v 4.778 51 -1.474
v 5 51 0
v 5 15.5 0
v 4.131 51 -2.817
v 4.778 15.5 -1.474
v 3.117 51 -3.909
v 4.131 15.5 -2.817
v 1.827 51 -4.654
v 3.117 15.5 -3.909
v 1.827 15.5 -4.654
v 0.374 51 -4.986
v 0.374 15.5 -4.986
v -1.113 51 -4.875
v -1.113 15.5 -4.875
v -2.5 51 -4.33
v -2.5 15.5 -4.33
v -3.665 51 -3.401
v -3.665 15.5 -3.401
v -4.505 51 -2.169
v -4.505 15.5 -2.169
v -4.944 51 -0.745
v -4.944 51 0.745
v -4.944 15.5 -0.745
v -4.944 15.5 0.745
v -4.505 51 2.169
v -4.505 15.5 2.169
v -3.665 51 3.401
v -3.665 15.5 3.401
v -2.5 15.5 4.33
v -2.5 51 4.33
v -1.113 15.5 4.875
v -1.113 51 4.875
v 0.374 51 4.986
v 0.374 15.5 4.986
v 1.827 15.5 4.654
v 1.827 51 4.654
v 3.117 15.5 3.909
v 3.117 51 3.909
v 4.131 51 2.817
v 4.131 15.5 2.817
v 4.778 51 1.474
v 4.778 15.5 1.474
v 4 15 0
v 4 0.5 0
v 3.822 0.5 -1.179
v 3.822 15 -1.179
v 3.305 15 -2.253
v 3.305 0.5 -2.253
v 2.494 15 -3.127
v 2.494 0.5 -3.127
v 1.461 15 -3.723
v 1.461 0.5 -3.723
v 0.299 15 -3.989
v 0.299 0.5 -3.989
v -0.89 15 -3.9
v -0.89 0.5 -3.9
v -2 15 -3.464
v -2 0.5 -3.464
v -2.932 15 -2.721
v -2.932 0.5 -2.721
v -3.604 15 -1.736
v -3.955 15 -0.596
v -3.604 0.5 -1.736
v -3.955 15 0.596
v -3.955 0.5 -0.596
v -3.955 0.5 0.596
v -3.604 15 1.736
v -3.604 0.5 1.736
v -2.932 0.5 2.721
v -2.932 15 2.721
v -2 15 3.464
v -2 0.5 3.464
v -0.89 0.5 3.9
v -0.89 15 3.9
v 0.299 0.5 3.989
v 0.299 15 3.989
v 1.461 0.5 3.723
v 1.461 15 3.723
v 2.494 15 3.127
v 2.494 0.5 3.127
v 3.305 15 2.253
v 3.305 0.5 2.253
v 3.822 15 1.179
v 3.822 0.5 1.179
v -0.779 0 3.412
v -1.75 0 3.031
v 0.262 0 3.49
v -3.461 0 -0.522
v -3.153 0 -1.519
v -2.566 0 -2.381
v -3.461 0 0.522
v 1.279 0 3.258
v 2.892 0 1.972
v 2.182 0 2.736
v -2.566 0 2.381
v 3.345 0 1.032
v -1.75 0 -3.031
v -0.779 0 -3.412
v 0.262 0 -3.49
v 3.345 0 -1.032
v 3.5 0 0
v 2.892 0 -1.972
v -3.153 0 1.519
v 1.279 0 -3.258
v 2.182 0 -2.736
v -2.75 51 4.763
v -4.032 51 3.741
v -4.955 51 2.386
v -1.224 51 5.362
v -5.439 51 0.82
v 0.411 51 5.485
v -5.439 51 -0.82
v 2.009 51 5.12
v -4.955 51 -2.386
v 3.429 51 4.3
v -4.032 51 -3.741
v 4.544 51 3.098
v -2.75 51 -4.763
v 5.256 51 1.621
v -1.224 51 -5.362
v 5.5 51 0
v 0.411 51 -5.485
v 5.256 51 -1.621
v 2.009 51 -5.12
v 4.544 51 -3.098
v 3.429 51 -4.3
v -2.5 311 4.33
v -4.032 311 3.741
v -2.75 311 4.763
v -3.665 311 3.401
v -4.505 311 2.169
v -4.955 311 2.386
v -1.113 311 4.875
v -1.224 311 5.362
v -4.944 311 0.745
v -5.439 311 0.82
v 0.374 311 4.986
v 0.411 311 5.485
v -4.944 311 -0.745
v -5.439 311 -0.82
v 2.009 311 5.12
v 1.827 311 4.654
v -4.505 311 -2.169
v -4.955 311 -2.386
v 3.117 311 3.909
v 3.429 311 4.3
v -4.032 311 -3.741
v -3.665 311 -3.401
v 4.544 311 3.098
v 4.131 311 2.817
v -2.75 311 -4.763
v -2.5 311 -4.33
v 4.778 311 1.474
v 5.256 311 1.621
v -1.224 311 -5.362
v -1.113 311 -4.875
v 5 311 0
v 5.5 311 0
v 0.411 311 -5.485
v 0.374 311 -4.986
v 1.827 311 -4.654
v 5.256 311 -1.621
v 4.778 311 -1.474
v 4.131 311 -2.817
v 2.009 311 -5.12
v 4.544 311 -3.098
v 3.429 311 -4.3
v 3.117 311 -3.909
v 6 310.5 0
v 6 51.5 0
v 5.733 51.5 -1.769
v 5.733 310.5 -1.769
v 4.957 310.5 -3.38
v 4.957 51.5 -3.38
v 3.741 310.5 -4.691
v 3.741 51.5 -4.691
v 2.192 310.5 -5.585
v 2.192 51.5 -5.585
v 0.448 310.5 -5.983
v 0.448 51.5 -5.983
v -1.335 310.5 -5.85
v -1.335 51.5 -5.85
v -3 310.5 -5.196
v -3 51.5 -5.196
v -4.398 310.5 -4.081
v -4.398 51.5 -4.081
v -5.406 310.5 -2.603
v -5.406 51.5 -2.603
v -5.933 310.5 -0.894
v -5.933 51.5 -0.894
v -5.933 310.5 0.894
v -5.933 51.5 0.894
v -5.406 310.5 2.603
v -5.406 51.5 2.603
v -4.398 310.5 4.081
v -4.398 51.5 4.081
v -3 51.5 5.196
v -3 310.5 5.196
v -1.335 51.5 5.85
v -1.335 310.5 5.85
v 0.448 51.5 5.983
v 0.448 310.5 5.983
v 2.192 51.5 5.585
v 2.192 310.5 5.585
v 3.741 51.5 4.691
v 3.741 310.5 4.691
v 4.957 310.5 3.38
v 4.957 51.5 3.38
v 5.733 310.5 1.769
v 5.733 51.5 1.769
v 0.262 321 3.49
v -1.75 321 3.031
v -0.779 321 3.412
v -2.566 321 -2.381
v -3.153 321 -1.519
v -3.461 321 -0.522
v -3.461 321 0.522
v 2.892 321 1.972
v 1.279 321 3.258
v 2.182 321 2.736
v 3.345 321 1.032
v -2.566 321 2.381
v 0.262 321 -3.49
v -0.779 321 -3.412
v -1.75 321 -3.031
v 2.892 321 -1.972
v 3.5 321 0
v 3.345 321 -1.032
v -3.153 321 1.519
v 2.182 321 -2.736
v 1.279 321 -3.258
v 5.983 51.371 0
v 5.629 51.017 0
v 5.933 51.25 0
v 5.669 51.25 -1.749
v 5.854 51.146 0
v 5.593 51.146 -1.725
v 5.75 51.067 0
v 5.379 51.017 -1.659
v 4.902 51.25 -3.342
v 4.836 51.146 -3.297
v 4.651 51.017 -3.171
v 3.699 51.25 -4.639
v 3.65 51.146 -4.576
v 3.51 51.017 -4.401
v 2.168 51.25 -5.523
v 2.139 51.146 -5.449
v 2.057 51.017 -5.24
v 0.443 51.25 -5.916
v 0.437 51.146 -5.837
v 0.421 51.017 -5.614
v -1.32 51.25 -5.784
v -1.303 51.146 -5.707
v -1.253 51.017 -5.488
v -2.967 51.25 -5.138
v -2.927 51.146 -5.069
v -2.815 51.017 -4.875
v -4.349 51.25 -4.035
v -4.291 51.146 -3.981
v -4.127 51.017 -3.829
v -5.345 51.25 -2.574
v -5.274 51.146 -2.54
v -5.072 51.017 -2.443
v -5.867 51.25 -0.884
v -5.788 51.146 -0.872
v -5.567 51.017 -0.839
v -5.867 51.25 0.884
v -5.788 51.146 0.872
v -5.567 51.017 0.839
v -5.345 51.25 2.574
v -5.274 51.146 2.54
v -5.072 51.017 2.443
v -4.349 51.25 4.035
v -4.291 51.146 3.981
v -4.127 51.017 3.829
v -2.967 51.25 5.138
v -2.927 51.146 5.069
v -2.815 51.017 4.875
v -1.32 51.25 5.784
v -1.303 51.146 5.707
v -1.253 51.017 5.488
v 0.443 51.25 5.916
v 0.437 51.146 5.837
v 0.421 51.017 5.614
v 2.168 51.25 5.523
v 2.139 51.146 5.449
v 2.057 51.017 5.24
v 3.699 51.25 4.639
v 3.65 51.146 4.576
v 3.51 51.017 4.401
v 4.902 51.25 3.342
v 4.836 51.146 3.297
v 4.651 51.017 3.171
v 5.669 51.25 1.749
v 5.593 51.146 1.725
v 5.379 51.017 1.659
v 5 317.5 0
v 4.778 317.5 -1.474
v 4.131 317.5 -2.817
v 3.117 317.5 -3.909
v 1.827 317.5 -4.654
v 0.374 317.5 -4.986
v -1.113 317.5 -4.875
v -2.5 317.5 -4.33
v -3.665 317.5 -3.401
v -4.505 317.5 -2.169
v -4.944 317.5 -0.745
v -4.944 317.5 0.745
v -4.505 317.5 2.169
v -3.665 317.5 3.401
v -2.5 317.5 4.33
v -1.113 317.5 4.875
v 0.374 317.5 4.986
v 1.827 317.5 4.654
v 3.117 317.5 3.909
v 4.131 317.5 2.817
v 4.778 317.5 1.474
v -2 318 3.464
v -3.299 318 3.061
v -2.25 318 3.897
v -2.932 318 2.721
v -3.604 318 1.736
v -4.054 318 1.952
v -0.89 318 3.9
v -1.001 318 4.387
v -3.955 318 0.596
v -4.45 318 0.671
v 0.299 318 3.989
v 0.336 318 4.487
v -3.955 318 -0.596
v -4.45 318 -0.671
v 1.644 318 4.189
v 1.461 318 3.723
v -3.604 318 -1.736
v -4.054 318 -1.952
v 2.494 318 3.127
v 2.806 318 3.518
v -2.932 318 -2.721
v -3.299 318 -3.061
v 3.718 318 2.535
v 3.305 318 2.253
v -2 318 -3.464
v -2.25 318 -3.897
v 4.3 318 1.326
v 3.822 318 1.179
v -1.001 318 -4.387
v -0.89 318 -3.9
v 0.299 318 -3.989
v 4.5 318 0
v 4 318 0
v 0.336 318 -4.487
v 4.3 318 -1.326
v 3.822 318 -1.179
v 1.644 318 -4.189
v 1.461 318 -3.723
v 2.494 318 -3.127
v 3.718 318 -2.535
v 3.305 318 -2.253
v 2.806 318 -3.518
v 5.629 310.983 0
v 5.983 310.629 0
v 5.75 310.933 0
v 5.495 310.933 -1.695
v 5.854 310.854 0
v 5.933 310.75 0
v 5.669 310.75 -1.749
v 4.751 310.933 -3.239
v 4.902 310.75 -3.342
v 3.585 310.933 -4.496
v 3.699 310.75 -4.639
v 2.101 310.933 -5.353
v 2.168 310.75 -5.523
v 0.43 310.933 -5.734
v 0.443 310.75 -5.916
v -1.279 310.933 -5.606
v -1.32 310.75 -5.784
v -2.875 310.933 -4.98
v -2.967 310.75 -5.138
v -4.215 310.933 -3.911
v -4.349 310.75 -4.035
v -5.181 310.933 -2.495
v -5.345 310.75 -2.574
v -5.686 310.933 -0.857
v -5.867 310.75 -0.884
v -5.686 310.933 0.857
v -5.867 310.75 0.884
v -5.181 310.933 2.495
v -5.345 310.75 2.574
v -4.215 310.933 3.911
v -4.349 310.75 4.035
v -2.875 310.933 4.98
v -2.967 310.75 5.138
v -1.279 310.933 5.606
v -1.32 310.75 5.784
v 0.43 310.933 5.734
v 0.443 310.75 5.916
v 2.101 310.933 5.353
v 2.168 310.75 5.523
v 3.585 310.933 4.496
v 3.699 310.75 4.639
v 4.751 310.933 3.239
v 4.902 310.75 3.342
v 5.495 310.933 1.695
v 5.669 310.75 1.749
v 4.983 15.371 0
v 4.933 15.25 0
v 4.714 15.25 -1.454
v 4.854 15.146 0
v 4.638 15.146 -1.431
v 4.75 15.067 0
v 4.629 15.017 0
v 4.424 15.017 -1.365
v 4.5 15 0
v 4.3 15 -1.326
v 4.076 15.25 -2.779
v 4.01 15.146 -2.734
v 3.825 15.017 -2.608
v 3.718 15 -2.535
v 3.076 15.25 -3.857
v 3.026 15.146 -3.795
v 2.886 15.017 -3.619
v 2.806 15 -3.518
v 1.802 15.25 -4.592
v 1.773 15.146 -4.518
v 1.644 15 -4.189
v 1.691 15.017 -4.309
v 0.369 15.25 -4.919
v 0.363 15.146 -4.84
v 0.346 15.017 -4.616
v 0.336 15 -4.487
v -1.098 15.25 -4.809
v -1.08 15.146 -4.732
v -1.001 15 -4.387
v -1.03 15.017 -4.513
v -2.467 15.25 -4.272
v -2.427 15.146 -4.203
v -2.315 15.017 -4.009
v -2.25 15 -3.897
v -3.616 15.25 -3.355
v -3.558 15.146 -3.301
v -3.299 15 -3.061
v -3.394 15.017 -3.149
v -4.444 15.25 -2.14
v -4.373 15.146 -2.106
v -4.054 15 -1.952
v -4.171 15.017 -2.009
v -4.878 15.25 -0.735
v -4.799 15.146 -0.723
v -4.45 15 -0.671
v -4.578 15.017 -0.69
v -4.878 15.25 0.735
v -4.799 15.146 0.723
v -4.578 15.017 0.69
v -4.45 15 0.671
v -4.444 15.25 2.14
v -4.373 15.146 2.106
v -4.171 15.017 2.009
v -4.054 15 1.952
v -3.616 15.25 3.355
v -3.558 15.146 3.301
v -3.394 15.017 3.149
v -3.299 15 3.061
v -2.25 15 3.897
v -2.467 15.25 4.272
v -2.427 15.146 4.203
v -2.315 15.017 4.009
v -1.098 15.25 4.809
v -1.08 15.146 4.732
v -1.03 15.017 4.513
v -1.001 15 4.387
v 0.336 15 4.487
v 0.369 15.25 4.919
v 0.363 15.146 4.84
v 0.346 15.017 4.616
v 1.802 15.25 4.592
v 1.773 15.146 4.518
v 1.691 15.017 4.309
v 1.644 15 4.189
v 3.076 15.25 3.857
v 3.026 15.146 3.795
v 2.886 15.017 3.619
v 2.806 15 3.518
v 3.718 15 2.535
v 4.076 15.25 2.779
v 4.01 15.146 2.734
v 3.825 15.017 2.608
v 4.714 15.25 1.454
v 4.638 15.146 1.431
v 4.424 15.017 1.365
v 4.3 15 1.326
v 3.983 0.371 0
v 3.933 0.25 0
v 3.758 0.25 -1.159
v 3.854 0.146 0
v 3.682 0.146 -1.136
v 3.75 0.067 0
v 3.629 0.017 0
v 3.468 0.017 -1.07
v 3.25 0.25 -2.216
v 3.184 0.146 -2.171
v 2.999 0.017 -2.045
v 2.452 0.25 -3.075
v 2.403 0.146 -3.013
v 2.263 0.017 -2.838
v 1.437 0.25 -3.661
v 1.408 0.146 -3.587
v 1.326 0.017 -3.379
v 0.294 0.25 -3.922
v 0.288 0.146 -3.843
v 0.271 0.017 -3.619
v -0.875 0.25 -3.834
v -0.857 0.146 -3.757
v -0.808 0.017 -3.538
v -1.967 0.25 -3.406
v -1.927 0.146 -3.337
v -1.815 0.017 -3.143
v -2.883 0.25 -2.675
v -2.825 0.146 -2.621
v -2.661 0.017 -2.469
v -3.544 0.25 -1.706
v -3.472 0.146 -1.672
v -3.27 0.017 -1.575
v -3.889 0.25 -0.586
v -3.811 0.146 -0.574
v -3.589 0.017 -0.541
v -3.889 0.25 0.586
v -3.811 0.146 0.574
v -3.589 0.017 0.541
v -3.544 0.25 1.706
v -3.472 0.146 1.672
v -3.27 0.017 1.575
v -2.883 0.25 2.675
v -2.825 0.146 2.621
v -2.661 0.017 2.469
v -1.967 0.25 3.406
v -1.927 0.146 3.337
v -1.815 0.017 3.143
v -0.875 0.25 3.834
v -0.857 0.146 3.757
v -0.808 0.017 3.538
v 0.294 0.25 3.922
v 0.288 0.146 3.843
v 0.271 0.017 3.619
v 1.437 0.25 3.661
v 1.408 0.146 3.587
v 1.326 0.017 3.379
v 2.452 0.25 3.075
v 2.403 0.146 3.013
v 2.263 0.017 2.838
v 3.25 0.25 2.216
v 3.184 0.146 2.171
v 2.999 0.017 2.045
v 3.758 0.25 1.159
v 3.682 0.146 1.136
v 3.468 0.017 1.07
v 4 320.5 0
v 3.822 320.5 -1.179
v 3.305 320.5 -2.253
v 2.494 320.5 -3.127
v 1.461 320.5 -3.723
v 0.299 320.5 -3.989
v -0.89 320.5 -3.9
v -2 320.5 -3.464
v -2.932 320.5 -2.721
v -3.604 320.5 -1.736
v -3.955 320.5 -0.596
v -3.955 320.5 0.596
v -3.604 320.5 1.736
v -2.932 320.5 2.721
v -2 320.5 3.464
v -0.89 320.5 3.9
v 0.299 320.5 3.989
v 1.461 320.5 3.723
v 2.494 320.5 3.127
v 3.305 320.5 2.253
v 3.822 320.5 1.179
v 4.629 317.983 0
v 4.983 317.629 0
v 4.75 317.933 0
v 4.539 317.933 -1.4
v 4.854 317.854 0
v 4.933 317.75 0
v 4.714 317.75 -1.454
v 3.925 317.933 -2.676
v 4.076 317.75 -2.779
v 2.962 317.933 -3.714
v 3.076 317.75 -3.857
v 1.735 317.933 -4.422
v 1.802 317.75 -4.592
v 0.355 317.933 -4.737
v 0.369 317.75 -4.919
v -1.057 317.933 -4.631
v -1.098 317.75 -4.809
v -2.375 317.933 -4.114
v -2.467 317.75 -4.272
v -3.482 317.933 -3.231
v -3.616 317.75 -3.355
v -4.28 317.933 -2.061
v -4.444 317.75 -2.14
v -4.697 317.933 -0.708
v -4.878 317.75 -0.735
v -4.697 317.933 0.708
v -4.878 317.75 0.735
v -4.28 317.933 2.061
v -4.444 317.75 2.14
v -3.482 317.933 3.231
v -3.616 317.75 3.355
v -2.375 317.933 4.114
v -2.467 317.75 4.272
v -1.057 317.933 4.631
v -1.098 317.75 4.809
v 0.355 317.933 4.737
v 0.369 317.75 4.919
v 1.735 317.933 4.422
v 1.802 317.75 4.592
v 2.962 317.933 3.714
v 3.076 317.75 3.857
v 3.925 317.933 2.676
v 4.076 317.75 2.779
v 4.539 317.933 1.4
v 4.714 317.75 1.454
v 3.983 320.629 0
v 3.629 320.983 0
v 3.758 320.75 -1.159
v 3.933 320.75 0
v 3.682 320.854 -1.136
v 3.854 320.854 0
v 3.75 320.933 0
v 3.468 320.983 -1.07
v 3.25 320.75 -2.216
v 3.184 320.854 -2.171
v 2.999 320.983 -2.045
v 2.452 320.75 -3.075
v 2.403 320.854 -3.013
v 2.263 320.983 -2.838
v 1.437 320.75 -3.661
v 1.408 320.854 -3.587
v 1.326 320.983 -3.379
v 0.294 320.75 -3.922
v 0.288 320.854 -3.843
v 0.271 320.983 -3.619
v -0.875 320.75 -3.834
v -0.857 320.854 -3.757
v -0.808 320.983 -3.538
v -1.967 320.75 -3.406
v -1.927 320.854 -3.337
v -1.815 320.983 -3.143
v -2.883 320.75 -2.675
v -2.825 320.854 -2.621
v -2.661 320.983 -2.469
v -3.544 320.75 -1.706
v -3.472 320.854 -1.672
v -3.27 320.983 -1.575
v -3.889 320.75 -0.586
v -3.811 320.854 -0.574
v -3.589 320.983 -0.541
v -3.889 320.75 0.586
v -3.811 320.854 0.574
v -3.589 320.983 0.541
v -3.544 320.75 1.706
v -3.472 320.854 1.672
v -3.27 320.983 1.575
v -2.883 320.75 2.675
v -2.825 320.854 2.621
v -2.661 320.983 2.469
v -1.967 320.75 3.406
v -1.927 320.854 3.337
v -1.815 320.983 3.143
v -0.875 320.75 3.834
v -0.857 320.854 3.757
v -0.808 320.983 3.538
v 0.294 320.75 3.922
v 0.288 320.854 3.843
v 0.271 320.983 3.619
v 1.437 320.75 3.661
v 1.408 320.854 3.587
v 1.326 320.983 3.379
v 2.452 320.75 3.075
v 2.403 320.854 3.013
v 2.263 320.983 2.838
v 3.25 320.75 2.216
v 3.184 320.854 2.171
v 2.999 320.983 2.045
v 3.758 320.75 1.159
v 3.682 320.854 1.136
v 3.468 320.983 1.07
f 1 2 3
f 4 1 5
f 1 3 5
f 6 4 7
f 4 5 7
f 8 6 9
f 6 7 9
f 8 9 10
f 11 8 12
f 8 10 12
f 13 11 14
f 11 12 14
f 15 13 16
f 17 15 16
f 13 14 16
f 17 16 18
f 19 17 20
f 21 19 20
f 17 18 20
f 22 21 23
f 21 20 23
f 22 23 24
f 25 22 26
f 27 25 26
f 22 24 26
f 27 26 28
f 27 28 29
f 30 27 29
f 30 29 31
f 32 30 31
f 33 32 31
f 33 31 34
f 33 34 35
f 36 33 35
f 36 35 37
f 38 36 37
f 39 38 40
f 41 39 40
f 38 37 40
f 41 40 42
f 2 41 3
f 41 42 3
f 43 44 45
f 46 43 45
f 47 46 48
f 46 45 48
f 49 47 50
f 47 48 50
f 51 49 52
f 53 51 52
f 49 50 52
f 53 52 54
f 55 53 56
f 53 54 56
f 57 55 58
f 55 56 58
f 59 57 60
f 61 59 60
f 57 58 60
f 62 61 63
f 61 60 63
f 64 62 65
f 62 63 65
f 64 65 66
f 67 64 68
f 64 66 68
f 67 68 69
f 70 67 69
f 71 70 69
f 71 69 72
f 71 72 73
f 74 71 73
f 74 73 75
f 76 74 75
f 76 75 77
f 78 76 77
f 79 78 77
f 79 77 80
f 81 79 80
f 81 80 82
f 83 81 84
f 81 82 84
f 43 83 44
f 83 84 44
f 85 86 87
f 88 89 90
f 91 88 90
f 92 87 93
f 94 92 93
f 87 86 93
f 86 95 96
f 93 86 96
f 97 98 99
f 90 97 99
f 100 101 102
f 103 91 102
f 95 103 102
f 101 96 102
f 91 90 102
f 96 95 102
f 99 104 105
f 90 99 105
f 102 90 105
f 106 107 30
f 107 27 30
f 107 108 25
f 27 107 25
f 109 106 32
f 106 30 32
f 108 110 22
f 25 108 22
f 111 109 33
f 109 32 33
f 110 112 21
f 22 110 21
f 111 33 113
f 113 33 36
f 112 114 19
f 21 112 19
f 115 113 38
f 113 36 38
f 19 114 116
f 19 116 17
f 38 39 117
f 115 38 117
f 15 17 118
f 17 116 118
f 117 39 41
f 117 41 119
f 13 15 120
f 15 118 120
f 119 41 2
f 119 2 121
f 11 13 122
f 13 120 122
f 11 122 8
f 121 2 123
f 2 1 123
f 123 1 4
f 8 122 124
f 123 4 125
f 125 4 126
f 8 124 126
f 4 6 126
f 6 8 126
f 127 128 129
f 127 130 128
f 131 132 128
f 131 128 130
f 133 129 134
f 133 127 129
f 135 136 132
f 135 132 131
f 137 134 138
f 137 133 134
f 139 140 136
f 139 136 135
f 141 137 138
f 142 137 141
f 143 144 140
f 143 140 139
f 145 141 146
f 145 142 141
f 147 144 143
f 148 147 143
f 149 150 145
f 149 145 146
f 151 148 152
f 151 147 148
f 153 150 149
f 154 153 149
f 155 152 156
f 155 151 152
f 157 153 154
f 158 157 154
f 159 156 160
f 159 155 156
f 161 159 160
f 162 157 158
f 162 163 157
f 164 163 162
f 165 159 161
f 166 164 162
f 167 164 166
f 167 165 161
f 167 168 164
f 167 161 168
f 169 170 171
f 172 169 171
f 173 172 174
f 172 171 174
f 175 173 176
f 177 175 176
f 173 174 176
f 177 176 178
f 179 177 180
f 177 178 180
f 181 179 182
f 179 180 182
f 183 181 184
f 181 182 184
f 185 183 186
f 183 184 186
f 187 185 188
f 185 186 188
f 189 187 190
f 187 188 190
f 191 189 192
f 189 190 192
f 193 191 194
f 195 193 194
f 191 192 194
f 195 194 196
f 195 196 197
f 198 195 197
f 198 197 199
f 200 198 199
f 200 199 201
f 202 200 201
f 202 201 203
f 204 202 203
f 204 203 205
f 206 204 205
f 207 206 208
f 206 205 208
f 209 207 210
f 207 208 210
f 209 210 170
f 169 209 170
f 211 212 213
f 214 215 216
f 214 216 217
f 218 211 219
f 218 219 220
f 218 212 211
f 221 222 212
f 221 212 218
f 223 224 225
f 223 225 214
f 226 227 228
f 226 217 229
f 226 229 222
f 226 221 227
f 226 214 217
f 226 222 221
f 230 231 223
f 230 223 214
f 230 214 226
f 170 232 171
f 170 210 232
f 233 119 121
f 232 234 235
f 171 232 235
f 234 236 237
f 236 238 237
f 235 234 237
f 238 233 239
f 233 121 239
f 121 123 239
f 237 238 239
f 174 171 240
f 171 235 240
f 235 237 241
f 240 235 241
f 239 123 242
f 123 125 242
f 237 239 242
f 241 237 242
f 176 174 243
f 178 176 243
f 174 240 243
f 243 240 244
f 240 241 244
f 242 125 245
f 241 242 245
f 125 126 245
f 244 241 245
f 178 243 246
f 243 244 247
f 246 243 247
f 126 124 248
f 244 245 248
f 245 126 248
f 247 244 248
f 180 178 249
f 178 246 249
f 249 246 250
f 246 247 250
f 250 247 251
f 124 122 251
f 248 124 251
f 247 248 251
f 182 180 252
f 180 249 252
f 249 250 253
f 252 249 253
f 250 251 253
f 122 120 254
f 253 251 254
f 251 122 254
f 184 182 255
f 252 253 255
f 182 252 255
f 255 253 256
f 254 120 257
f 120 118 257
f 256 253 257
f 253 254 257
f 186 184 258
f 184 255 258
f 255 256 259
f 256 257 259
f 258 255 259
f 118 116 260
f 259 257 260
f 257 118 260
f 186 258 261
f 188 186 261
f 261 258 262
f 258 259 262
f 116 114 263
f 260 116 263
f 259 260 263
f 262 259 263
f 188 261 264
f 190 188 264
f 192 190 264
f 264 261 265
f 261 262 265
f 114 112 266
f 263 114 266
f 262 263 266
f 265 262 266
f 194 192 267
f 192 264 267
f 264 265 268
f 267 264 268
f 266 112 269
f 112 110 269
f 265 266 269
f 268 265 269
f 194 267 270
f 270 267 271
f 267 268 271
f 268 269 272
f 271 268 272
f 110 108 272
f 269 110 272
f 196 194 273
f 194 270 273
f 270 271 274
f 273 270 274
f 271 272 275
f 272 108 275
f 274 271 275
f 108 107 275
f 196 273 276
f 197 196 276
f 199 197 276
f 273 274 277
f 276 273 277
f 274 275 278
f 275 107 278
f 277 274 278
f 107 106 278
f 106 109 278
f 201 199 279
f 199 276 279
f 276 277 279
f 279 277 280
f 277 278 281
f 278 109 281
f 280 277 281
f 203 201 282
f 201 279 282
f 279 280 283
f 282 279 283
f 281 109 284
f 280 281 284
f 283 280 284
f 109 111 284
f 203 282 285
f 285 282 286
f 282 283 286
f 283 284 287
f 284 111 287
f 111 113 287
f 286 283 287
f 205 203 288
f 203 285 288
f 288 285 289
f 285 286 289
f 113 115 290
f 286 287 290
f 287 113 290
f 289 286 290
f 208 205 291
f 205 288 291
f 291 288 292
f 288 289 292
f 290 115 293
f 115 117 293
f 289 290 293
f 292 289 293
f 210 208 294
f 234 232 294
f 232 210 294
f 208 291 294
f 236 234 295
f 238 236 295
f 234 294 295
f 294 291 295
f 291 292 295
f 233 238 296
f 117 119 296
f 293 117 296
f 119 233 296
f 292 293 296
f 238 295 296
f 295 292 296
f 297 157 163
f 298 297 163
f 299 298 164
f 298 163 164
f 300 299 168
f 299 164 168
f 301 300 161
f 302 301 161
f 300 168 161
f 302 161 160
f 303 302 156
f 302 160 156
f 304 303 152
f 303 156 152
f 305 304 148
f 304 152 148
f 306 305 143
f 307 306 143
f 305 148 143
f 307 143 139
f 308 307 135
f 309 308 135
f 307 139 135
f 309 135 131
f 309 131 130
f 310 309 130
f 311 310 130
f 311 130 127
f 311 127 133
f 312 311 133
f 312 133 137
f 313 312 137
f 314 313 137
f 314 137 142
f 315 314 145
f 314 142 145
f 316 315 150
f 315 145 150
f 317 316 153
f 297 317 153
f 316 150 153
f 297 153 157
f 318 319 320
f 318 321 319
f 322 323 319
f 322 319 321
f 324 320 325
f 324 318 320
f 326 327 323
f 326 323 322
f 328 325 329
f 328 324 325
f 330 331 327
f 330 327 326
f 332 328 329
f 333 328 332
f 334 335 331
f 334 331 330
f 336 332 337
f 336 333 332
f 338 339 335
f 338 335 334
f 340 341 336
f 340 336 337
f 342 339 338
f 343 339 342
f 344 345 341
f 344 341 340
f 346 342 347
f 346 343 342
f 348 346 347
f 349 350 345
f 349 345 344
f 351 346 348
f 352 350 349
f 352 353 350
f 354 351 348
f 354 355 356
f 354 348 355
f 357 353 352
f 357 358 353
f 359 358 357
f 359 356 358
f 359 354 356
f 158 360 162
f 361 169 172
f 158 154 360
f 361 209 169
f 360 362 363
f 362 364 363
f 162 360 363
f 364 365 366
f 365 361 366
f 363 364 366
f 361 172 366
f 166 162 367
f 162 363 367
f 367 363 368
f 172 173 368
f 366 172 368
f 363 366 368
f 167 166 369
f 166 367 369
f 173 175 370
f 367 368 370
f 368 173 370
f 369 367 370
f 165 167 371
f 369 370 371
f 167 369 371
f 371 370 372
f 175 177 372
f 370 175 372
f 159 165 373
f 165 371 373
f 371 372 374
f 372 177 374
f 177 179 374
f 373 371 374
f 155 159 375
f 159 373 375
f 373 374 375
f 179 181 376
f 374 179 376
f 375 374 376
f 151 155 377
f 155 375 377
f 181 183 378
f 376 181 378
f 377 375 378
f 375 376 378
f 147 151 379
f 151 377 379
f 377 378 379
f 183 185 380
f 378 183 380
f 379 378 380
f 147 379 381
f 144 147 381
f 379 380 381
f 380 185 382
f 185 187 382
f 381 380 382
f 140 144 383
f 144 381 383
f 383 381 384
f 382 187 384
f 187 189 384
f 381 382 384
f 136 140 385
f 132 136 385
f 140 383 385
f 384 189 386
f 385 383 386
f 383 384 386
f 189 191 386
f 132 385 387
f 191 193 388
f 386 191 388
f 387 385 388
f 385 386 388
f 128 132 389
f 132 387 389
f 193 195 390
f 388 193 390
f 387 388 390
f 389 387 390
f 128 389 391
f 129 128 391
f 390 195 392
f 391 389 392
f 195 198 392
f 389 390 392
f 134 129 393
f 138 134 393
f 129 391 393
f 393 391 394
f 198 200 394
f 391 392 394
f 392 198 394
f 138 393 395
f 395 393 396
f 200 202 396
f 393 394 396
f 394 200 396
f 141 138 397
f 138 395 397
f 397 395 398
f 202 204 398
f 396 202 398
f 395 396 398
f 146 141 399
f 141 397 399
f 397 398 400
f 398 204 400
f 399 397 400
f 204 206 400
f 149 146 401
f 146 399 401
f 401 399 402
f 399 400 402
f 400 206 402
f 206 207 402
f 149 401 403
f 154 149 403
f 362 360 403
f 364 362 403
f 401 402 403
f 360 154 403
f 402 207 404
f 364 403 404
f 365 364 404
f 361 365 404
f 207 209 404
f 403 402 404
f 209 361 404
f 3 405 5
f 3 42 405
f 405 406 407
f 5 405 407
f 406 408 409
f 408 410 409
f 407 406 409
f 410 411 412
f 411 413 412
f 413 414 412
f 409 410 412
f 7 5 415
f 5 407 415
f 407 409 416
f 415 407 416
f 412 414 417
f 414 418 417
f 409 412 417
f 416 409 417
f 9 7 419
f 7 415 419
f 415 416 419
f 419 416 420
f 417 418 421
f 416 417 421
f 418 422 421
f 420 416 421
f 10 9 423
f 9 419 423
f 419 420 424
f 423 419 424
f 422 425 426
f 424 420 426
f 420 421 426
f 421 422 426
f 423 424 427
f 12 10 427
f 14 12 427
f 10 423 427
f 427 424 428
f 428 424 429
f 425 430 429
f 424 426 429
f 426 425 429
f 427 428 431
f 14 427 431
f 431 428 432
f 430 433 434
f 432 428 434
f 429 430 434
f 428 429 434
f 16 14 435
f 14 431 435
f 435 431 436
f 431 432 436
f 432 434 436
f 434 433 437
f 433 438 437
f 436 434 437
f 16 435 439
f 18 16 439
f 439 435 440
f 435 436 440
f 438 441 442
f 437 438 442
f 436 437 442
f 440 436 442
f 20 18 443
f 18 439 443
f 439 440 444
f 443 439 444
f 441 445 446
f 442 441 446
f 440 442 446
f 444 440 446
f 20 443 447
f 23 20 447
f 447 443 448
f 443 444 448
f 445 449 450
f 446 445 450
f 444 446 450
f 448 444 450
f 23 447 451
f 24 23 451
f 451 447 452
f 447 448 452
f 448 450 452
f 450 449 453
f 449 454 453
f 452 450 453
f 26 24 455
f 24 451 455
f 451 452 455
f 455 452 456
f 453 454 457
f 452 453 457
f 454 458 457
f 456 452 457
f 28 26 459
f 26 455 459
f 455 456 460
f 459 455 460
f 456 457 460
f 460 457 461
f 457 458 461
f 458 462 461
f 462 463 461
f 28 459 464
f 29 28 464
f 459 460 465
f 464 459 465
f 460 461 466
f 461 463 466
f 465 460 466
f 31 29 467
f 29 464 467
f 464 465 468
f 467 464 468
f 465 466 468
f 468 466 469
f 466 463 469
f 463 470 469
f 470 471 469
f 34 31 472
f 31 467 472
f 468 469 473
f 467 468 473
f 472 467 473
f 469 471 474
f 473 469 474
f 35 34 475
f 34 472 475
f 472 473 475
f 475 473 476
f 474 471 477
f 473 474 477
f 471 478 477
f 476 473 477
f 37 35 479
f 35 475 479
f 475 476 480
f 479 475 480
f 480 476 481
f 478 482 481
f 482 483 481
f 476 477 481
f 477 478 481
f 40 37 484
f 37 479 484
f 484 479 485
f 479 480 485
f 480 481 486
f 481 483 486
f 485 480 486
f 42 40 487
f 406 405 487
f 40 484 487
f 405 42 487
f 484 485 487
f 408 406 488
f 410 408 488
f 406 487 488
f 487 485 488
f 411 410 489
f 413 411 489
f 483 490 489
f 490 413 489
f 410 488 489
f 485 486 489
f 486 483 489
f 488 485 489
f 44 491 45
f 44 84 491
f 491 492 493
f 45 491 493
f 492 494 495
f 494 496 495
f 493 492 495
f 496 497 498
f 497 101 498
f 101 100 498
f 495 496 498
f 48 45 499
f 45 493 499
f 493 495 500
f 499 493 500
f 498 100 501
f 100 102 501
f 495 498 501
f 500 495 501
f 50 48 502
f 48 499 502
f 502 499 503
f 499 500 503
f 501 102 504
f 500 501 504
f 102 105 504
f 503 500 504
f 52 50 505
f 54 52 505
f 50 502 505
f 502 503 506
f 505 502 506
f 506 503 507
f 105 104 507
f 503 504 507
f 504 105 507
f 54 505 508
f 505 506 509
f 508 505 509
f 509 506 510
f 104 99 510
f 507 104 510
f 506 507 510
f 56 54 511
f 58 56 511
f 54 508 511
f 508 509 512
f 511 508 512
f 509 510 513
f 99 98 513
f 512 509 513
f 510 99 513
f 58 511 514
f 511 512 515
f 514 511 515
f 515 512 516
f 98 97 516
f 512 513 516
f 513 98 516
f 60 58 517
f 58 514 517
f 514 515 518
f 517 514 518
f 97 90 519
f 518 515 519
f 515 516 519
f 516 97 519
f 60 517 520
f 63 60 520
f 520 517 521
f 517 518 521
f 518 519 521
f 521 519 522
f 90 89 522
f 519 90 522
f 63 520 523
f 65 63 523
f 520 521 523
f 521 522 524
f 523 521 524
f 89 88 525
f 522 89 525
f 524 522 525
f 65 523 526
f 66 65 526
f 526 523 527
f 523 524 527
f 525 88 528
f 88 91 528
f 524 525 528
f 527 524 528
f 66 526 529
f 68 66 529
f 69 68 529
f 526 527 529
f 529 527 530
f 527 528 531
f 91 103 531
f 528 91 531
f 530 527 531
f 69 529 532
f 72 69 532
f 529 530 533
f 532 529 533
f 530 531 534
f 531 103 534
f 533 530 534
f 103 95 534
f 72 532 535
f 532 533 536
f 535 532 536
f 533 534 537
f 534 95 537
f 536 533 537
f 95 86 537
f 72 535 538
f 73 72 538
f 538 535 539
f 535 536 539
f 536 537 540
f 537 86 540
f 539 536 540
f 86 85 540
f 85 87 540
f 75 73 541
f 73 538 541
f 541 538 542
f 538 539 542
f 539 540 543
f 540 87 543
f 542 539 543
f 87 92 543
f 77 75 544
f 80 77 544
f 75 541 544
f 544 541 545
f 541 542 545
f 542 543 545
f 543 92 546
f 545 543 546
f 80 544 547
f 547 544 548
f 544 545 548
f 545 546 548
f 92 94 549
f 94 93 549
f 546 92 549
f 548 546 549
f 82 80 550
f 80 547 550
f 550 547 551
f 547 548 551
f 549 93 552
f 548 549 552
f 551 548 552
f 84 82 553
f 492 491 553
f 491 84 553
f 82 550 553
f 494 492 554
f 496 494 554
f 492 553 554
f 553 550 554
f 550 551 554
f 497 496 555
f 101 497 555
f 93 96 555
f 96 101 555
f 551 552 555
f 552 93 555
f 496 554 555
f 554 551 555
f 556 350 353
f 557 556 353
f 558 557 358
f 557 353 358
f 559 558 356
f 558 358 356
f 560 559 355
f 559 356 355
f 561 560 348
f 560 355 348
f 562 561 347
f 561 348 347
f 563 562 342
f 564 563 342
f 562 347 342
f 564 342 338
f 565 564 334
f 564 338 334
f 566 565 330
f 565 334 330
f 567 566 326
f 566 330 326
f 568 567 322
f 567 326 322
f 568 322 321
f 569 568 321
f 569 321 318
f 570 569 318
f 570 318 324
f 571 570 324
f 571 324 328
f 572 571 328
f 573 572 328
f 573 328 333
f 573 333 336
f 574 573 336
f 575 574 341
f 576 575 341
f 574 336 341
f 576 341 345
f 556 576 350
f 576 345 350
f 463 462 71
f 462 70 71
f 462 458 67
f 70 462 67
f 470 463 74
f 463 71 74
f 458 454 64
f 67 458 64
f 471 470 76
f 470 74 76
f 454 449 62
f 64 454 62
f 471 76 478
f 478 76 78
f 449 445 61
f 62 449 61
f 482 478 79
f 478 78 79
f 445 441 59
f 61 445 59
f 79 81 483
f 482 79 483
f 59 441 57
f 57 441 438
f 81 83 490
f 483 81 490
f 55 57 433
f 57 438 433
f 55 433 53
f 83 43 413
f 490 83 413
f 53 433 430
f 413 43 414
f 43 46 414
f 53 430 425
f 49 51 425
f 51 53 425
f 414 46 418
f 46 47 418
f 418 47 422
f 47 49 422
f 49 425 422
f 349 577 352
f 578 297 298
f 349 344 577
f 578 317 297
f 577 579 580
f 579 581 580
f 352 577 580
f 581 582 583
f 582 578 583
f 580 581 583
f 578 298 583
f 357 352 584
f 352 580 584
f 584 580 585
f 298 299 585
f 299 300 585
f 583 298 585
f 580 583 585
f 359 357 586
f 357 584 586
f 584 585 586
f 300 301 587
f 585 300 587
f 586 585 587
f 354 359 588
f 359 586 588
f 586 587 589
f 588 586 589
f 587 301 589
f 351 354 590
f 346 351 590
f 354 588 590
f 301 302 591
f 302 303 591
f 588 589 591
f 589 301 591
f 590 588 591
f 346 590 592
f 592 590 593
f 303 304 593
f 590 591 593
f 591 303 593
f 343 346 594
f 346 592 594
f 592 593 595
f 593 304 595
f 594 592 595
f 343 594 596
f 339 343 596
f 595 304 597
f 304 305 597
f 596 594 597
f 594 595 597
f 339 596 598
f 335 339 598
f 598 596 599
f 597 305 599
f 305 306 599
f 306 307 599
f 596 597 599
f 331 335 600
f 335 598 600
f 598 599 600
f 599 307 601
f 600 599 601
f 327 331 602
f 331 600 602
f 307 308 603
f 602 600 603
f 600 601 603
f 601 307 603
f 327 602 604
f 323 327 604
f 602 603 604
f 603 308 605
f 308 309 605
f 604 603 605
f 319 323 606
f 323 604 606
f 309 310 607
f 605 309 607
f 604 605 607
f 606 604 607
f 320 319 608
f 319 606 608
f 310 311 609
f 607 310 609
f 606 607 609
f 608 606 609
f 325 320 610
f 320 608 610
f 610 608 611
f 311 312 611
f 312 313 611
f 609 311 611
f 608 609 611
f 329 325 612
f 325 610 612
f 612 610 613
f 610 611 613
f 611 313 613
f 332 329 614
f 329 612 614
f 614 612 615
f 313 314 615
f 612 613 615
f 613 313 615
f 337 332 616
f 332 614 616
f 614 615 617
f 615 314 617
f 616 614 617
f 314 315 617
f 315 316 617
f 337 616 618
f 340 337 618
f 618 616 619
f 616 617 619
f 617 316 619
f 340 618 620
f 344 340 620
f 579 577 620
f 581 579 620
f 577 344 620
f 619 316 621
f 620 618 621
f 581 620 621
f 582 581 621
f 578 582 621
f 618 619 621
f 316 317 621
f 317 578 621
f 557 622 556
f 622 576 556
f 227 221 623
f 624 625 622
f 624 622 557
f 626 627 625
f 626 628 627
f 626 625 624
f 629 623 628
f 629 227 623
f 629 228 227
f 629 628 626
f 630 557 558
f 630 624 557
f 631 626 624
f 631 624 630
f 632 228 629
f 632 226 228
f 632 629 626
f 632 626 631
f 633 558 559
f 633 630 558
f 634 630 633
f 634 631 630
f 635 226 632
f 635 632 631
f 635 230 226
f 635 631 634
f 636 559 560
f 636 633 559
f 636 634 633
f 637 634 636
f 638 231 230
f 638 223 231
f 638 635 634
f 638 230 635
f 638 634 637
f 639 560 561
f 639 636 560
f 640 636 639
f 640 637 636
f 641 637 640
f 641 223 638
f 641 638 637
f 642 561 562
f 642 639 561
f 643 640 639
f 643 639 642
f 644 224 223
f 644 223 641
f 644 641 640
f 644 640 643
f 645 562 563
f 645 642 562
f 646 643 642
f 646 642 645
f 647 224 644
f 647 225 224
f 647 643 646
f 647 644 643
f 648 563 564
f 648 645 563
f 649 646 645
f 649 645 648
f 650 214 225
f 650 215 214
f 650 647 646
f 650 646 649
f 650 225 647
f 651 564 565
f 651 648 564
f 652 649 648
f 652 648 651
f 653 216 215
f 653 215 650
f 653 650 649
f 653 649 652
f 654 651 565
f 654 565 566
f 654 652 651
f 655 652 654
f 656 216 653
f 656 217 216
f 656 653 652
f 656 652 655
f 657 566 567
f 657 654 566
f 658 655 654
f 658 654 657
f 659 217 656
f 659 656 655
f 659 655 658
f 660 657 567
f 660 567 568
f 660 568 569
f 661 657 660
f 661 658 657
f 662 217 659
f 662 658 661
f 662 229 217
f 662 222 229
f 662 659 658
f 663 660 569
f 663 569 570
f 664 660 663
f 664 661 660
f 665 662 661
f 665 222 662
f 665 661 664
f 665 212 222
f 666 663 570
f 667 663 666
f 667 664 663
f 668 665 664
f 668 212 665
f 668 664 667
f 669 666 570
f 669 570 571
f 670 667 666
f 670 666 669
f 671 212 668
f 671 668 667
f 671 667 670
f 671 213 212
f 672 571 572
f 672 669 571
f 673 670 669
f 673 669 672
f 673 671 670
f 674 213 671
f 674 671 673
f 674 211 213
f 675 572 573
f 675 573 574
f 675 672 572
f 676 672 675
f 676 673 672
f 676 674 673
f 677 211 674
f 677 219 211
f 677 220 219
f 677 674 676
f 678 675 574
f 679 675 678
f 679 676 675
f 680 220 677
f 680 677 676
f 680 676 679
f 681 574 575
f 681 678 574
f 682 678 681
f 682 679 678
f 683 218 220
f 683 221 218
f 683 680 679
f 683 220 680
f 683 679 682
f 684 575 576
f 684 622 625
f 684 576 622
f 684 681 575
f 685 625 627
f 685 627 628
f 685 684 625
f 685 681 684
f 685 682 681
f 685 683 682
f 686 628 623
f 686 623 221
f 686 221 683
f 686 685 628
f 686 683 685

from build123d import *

# Parameters (mm, degrees)
SKETCH_1_R      = 4
EXTRUDE_1_DEPTH = 15
SKETCH_2_R      = 5
EXTRUDE_2_DEPTH = 36
SKETCH_3_R      = 6
EXTRUDE_3_DEPTH = 260
SKETCH_4_R      = 5
EXTRUDE_4_DEPTH = 7
SKETCH_5_R      = 4
EXTRUDE_5_DEPTH = 3
FILLET_1_R      = 0.5
FILLET_2_R      = 0.5
FILLET_3_R      = 0.5
FILLET_4_R      = 0.5
FILLET_5_R      = 0.5
FILLET_6_R      = 0.5


with BuildPart() as part:
    # 草图1 → 凸台-拉伸1 (new body)
    with BuildSketch(Plane(origin=(0, 0, 0), x_dir=(1, 0, 0), z_dir=(0, 1, 0))):
        Circle(SKETCH_1_R)
    extrude(amount=EXTRUDE_1_DEPTH)

    # 草图2 → 凸台-拉伸2 (add)
    with BuildSketch(Plane(origin=(0, 15, 0), x_dir=(1, 0, 0), z_dir=(0, 1, 0))):
        Circle(SKETCH_2_R)
    extrude(amount=EXTRUDE_2_DEPTH)

    # 草图3 → 凸台-拉伸3 (add)
    with BuildSketch(Plane(origin=(0, 51, 0), x_dir=(1, 0, 0), z_dir=(0, 1, 0))):
        Circle(SKETCH_3_R)
    extrude(amount=EXTRUDE_3_DEPTH)

    # 草图4 → 凸台-拉伸4 (add)
    with BuildSketch(Plane(origin=(0, 311, 0), x_dir=(1, 0, 0), z_dir=(0, 1, 0))):
        Circle(SKETCH_4_R)
    extrude(amount=EXTRUDE_4_DEPTH)

    # 草图5 → 凸台-拉伸5 (add)
    with BuildSketch(Plane(origin=(0, 318, 0), x_dir=(1, 0, 0), z_dir=(0, 1, 0))):
        Circle(SKETCH_5_R)
    extrude(amount=EXTRUDE_5_DEPTH)

    # 圆角1
    fillet_1_edges = [part.edges().sort_by_distance(p)[0] for p in [
        (-4, 321, 0),
    ]]
    fillet(fillet_1_edges, radius=FILLET_1_R)

    # 圆角2
    fillet_2_edges = [part.edges().sort_by_distance(p)[0] for p in [
        (-5, 318, 0),
    ]]
    fillet(fillet_2_edges, radius=FILLET_2_R)

    # 圆角3
    fillet_3_edges = [part.edges().sort_by_distance(p)[0] for p in [
        (-6, 311, 0),
    ]]
    fillet(fillet_3_edges, radius=FILLET_3_R)

    # 圆角4
    fillet_4_edges = [part.edges().sort_by_distance(p)[0] for p in [
        (-6, 51, 0),
    ]]
    fillet(fillet_4_edges, radius=FILLET_4_R)

    # 圆角5
    fillet_5_edges = [part.edges().sort_by_distance(p)[0] for p in [
        (-5, 15, 0),
    ]]
    fillet(fillet_5_edges, radius=FILLET_5_R)

    # 圆角6
    fillet_6_edges = [part.edges().sort_by_distance(p)[0] for p in [
        (-4, 0, 0),
    ]]
    fillet(fillet_6_edges, radius=FILLET_6_R)


solid = part.part
